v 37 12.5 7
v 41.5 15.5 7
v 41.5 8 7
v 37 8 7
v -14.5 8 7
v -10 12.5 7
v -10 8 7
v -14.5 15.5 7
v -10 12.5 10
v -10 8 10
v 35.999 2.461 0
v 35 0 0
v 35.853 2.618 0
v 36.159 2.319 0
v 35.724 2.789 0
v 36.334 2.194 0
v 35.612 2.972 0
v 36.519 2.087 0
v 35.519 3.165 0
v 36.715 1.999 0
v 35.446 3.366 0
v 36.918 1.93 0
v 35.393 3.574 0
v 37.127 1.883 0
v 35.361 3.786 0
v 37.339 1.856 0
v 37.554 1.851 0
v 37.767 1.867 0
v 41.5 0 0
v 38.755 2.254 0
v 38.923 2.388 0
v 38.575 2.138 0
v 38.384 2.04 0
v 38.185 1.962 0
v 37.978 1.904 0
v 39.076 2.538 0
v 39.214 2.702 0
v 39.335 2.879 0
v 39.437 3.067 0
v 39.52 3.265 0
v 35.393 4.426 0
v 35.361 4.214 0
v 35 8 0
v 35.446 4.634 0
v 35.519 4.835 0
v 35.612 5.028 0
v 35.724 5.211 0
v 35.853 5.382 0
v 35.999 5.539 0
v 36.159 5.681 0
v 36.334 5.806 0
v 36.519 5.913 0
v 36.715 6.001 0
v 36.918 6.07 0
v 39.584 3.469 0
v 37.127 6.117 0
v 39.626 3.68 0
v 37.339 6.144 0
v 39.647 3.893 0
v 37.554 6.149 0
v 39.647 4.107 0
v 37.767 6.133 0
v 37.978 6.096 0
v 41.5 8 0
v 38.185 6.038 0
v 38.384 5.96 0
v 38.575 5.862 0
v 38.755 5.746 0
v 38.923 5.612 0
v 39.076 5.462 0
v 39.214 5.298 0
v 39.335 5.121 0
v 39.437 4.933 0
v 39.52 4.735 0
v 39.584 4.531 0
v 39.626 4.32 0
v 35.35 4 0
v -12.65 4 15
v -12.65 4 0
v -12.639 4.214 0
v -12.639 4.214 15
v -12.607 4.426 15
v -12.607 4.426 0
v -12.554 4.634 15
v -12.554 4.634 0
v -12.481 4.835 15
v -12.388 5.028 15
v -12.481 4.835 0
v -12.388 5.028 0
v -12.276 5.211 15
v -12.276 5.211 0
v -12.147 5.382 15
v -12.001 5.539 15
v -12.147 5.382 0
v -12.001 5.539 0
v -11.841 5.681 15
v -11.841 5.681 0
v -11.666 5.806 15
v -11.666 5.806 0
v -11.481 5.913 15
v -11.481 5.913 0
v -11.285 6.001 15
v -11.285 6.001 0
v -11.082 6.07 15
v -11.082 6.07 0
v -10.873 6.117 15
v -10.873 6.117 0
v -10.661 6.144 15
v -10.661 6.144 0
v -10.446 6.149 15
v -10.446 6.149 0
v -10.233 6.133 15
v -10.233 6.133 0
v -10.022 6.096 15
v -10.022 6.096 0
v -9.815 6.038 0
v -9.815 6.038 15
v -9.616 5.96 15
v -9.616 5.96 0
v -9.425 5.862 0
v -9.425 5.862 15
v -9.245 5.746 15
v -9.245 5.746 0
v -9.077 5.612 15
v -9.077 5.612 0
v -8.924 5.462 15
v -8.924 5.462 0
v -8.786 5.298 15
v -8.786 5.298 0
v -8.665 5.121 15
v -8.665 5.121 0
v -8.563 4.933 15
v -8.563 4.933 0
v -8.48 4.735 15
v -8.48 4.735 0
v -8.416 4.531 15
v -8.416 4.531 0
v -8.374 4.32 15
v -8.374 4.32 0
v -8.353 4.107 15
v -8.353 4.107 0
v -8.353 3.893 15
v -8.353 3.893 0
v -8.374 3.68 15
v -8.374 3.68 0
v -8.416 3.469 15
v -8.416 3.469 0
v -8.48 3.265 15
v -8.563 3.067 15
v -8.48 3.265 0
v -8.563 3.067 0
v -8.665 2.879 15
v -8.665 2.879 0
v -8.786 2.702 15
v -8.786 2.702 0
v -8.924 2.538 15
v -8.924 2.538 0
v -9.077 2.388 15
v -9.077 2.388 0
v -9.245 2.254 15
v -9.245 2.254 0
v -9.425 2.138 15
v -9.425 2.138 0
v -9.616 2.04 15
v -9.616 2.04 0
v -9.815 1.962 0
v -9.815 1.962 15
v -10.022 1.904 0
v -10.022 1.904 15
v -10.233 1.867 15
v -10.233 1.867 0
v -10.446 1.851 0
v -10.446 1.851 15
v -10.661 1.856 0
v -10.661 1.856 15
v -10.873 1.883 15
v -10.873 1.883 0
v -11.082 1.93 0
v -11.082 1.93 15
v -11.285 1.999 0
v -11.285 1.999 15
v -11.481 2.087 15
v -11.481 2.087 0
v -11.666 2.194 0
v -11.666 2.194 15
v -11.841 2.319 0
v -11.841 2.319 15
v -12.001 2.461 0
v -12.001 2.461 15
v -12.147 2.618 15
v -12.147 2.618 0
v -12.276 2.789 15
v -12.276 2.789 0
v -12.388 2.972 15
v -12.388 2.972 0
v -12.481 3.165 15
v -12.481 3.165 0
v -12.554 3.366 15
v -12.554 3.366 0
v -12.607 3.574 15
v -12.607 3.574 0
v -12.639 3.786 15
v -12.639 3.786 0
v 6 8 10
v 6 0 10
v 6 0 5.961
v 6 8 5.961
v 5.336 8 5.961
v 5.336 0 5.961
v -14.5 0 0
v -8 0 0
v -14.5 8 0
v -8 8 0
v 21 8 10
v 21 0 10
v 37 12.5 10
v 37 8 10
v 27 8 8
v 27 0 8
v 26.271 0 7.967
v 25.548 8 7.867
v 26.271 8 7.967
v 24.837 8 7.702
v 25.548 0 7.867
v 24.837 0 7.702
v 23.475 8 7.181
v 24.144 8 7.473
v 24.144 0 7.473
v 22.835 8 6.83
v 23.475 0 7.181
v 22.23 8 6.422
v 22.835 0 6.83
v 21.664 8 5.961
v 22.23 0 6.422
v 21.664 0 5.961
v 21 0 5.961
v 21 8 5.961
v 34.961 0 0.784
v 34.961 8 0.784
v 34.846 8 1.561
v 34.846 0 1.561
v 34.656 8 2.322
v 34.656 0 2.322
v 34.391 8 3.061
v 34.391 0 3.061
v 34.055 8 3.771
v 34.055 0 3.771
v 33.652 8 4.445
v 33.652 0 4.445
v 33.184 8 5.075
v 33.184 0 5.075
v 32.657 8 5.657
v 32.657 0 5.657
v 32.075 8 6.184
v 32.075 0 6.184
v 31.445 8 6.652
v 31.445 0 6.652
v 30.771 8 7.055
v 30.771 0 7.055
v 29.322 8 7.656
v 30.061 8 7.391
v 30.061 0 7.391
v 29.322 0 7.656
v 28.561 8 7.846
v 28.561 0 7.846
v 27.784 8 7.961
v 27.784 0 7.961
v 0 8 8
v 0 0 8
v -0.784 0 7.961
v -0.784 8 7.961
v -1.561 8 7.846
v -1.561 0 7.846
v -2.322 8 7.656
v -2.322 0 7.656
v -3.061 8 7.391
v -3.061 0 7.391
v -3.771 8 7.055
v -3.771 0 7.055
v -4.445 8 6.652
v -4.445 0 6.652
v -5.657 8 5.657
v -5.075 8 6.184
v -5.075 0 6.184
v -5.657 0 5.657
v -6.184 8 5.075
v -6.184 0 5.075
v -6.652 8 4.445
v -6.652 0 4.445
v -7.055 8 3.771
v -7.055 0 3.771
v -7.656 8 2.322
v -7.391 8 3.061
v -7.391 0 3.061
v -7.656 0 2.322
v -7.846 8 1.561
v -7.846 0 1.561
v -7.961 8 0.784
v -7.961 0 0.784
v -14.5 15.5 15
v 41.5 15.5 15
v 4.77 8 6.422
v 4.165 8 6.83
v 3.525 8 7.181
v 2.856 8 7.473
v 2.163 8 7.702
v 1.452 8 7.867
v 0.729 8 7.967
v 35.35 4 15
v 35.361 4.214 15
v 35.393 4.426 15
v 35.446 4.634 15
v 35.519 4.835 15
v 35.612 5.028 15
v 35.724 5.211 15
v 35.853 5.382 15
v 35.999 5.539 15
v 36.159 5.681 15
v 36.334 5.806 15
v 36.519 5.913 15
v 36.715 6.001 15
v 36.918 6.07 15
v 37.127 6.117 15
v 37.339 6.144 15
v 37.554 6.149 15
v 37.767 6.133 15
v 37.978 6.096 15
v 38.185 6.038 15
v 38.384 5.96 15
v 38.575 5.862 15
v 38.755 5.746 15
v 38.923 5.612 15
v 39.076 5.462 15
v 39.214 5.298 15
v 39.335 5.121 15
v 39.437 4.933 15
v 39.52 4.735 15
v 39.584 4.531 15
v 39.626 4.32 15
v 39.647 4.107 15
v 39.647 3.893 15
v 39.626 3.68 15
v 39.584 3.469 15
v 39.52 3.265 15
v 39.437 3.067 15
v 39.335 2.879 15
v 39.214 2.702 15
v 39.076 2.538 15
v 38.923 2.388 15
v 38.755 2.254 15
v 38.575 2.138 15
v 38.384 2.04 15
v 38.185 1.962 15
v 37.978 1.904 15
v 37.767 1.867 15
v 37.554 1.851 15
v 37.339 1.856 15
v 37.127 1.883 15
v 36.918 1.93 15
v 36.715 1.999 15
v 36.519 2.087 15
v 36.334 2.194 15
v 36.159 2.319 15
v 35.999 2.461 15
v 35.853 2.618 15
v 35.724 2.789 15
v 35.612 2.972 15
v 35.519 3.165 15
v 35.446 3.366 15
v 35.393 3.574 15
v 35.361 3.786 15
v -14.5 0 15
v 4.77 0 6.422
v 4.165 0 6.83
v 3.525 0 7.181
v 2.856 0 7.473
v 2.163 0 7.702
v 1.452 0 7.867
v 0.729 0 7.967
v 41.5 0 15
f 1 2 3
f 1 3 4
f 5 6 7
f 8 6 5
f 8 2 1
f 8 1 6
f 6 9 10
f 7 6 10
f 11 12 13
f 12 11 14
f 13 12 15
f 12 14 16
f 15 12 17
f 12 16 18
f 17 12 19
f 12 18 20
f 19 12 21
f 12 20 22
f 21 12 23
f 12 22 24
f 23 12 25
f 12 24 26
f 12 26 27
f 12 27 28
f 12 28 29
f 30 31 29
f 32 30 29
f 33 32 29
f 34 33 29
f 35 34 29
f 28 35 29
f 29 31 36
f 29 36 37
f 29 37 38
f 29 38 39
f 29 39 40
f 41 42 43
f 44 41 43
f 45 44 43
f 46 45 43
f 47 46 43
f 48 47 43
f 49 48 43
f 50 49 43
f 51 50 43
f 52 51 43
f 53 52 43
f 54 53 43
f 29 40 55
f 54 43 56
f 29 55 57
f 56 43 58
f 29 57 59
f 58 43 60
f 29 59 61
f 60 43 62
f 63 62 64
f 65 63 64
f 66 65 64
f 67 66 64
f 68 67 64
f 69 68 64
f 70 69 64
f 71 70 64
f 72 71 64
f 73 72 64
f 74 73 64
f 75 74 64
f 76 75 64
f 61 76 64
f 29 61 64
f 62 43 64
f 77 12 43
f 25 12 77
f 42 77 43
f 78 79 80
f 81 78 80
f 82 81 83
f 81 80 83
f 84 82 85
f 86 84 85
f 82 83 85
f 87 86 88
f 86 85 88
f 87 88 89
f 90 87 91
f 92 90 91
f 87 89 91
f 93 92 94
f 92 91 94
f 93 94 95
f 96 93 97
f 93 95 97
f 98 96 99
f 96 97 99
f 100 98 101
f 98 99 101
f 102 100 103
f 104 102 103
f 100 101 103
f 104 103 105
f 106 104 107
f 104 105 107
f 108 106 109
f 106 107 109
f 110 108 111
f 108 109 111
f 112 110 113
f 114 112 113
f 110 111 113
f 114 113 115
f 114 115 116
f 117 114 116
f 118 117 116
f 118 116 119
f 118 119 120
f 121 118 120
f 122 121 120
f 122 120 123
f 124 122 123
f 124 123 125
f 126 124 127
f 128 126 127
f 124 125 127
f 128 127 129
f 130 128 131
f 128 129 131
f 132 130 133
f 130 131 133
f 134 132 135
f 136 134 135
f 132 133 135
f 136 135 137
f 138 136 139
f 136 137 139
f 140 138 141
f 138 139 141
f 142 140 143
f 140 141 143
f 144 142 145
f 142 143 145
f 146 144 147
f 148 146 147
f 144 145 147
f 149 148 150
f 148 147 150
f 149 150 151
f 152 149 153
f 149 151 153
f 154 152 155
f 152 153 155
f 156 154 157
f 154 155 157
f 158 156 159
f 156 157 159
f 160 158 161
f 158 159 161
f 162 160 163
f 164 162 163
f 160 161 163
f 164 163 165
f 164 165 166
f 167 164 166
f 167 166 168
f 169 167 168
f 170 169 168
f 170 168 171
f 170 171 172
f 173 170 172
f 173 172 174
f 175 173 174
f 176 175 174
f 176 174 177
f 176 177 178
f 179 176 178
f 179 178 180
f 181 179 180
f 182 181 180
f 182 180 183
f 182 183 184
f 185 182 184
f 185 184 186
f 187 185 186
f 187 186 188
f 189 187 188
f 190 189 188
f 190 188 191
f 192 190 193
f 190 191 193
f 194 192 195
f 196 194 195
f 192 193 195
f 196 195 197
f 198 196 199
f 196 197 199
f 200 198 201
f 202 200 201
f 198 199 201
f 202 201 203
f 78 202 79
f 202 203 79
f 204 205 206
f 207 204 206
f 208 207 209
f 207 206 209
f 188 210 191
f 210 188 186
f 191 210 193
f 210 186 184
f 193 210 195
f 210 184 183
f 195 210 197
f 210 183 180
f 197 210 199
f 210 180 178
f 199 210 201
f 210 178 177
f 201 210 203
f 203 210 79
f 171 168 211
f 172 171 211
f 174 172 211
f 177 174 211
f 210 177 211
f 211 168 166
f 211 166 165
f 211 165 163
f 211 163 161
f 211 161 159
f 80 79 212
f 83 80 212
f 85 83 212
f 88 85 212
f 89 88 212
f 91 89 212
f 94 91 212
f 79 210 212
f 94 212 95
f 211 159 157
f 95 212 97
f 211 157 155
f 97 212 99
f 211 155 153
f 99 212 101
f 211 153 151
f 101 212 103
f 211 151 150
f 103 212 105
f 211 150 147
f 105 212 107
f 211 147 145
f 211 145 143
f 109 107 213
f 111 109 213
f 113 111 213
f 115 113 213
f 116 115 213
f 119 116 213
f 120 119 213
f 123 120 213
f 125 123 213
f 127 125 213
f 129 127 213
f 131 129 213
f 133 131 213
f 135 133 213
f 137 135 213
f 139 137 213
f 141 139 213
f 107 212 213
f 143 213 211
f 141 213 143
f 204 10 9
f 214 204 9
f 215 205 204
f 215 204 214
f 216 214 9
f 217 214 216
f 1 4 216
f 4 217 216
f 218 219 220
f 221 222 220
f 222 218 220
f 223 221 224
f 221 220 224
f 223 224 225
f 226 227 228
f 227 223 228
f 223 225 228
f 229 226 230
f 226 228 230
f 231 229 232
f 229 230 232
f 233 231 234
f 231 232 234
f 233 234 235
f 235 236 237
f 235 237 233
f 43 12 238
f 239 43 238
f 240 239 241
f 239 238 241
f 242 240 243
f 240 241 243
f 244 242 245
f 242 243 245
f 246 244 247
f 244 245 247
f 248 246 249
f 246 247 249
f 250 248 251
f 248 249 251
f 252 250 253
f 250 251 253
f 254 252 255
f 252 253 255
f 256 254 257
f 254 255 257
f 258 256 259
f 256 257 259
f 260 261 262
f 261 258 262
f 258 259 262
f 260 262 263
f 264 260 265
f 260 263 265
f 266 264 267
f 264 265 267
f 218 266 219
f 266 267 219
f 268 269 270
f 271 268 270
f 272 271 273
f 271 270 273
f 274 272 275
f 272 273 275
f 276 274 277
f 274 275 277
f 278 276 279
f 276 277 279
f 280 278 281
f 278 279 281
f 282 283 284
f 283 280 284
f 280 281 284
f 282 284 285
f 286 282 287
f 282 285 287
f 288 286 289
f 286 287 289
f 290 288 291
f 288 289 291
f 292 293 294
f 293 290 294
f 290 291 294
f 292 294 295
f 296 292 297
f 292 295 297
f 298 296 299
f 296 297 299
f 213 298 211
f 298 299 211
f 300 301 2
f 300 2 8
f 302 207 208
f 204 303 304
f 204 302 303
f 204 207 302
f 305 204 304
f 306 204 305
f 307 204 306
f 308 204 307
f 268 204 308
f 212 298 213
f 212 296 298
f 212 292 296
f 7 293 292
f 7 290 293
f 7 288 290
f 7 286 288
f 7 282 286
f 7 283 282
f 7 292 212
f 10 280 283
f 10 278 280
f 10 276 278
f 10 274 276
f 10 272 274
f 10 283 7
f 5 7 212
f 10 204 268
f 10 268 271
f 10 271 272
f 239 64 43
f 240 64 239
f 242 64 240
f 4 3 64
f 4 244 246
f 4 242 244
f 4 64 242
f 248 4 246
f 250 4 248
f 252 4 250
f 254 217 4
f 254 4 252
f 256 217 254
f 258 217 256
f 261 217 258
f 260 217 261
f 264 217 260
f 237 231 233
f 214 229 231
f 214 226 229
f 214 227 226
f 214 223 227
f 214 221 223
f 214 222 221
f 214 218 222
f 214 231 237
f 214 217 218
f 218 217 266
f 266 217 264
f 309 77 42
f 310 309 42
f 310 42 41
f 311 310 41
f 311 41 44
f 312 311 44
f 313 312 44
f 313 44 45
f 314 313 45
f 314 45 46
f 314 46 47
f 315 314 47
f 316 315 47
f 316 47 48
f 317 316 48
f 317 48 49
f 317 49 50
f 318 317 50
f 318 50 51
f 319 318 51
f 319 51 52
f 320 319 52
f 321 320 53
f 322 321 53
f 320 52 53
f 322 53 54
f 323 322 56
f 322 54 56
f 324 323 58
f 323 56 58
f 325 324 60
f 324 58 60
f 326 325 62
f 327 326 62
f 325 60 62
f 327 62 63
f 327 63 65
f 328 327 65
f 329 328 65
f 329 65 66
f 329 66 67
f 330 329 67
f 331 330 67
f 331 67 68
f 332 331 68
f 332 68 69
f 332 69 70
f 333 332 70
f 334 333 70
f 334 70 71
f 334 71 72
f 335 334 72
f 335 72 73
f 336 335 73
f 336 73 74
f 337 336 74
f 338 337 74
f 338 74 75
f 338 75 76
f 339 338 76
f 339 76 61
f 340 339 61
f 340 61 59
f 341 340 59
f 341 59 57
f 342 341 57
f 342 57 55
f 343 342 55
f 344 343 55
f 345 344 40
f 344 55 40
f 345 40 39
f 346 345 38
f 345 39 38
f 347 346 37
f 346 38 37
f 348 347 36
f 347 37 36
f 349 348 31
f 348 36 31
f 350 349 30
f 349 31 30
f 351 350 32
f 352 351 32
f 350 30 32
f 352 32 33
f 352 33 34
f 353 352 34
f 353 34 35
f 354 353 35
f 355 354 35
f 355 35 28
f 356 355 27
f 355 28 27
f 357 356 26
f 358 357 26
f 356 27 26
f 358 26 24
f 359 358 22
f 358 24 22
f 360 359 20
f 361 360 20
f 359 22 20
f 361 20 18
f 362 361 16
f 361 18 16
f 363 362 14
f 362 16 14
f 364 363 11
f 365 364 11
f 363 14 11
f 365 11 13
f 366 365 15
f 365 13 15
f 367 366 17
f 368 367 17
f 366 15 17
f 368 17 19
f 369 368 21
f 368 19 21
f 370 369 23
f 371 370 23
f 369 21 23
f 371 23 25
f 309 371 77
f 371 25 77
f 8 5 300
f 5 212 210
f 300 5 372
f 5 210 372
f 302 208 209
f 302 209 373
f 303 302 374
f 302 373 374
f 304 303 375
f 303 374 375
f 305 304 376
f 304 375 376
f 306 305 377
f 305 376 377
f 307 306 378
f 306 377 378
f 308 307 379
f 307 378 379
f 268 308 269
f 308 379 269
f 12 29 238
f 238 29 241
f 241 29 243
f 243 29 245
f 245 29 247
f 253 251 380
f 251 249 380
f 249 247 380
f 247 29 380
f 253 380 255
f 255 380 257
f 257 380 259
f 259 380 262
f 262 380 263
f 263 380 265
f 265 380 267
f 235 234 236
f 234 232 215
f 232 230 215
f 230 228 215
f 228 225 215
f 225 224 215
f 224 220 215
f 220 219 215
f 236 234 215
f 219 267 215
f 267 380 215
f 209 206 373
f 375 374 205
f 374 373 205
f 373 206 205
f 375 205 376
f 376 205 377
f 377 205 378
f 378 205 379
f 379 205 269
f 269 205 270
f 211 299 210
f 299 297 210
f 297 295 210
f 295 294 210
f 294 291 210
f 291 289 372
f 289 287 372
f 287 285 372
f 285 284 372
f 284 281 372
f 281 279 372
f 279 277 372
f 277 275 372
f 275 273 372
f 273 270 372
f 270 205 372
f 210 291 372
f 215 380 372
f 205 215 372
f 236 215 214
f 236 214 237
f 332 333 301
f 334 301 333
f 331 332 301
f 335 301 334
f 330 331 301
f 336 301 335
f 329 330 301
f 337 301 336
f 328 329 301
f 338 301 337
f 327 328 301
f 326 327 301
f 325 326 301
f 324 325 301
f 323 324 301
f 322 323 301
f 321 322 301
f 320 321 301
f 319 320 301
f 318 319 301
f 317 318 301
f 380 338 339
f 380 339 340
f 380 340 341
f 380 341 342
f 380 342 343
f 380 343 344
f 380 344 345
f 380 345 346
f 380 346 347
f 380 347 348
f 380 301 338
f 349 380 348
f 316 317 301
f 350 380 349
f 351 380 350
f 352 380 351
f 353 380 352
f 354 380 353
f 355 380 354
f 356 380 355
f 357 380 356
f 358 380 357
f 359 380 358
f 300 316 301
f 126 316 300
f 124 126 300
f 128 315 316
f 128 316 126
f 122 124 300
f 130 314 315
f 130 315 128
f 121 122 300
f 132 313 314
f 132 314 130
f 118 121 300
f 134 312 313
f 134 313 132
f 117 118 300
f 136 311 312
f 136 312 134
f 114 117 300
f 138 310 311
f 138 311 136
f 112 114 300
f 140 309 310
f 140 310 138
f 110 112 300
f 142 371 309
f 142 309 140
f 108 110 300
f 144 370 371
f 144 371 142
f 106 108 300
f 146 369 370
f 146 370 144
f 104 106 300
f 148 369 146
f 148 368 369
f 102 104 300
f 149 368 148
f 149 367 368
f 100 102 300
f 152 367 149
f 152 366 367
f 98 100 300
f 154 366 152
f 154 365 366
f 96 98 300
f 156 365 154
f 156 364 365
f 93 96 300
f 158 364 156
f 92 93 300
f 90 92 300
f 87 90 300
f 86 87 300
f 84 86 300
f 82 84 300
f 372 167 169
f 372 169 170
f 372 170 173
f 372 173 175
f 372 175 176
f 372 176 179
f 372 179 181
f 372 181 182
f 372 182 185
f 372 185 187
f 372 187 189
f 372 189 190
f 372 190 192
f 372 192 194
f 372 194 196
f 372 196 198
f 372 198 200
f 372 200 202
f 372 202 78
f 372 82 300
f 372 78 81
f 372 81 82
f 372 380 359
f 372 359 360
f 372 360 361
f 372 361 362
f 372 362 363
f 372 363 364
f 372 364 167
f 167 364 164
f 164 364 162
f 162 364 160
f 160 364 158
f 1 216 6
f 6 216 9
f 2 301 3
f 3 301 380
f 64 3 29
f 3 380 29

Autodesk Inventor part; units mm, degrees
ref_plane "YZ Plane" through (0, 0, 0) normal (1, 0, 0) x (0, 1, 0)
ref_plane "XZ Plane" through (0, 0, 0) normal (0, 1, 0) x (-1, 0, 0)
ref_plane "XY Plane" through (0, 0, 0) normal (0, 0, 1) x (1, 0, 0)
sketch "Sketch1" plane through (0, 0, 0) normal (0, 1, 0) x (-1, 0, 0)
  line L0 (0, 0) -> (-27, 0) construction
  line L1 (-27, -8) -> (0, -8)
  arc A0 (0, -8) -> (0, 8) centre (0, 0) ccw
  arc A1 (-27, 8) -> (-27, -8) centre (-27, 0) ccw
  line L2 (14.5, 10) -> (-41.5, 10)
  line L3 (-41.5, 10) -> (-41.5, -10)
  line L4 (-41.5, -10) -> (14.5, -10)
  line L5 (14.5, -10) -> (14.5, 10)
  line L6 (14.5, 10) -> (-41.5, -10) construction
  line L7 (-41.5, 10) -> (14.5, -10) construction
  line L8 (14.5, 10) -> (-41.5, 10)
  line L9 (-41.5, 10) -> (-41.5, 15)
  line L10 (-41.5, 15) -> (14.5, 15)
  line L11 (14.5, 15) -> (14.5, 10)
  arc A2 (0, -8) -> (-5.3358, 5.9607) centre (0, 0) ccw
  arc A3 (-21.6642, 5.9607) -> (-27, -8) centre (-27, 0) ccw
  line L12 (9, -10) -> (-36, -10)
  line L13 (-36, -10) -> (-36, 10) construction
  line L14 (-36, 10) -> (9, 10)
  line L15 (9, 10) -> (9, -10) construction
  line L16 (9, -10) -> (-36, 10) construction
  line L17 (-36, -10) -> (9, 10) construction
  line L18 (9, 10) -> (-6, 10)
  line L19 (-6, 10) -> (-6, 5.9607)
  line L20 (-36, 10) -> (-21, 10)
  line L21 (-21, 10) -> (-21, 5.9607)
  line L22 (-5.3358, 5.9607) -> (-21.6642, 5.9607) construction
  line L23 (-21, 5.9607) -> (-21.6642, 5.9607)
  line L24 (-6, 5.9607) -> (-5.3358, 5.9607)
  point P0 (-13.5, 0)
  point P1 (-27, 8)
  point P2 (0, 8)
  dimension "d0" = 27
  dimension "d1" = 16
  dimension "d2" = 56
  dimension "d3" = 20
  dimension "d4" = 5
  dimension "d5" = 45
  dimension "d6" = 15
  dimension "d7" = 15
extrude "Extrusion1" add sketch "Sketch1" along normal blind 8 contours L1 A0 A2 L24 L19 L2 L5 L4 L3 L21 L23 A3 A1
extrude "Extrusion2" add sketch "Sketch1" along normal blind 15.5 contours L2 L9 L10 L11
sketch "Sketch2" plane through (21, 0, 10) normal (0, 0, -1) x (-1, 0, 0)
  line L0 (35.5, 8) -> (15, 8) projected
  line L1 (-20.5, 8) -> (-20.5, 15.5) projected
  line L2 (35.5, 8) -> (-20.5, 8)
  line L3 (-20.5, 8) -> (-20.5, 15.5)
  line L4 (-20.5, 15.5) -> (35.5, 15.5)
  line L5 (35.5, 15.5) -> (35.5, 8)
  line L6 (31, 8) -> (-16, 8)
  line L7 (-16, 8) -> (-16, 12.5)
  line L8 (-16, 12.5) -> (31, 12.5)
  line L9 (31, 12.5) -> (31, 8)
  line L10 (-20.5, 8) -> (35.5, 8) projected
  point P0 (21, 0)
  point P1 (7.5, 8)
  dimension "d12" = 47
  dimension "d13" = 4.5
extrude "Extrusion3" add sketch "Sketch2" along normal blind 3 contours L0 L9 L8 L7 L2 L1 L4 L5
sketch "Sketch3" plane through (41.5, 0, -10) normal (0, 0, -1) x (-1, 0, 0)
  circle A0 centre (52, 4) radius 2.15
  line L0 (56, 0) -> (56, 8) projected
  line L1 (0, 0) -> (56, 0) projected
  circle A1 centre (4, 4) radius 2.15
  line L2 (0, 0) -> (0, 8) projected
  point P0 (41.5, 0)
  dimension "d16" = 4.3
  dimension "d17" = 4
  dimension "d18" = 4
  dimension "d19" = 4.3
  dimension "d20" = 4
  dimension "d21" = 4
extrude "Extrusion4" cut sketch "Sketch3" against normal blind 32
sketch "Sketch5" plane through (0, 8, 0) normal (0, 1, 0) x (1, 0, 0)
  line L0 (-14.5, 10) -> (-14.5, -15) projected
  line L1 (41.5, 10) -> (-14.5, 10) projected
  line L2 (-14.5, 0) -> (41.5, 0)
  line L3 (41.5, 0) -> (41.5, 10)
  line L4 (41.5, 10) -> (-14.5, 10)
  line L5 (-14.5, 10) -> (-14.5, 0)
  point P0 (0, 0)
extrude "Extrusion6" cut sketch "Sketch5" against normal blind 10
properties part number "Ultrasonic_sensor_frame_Buttom"
